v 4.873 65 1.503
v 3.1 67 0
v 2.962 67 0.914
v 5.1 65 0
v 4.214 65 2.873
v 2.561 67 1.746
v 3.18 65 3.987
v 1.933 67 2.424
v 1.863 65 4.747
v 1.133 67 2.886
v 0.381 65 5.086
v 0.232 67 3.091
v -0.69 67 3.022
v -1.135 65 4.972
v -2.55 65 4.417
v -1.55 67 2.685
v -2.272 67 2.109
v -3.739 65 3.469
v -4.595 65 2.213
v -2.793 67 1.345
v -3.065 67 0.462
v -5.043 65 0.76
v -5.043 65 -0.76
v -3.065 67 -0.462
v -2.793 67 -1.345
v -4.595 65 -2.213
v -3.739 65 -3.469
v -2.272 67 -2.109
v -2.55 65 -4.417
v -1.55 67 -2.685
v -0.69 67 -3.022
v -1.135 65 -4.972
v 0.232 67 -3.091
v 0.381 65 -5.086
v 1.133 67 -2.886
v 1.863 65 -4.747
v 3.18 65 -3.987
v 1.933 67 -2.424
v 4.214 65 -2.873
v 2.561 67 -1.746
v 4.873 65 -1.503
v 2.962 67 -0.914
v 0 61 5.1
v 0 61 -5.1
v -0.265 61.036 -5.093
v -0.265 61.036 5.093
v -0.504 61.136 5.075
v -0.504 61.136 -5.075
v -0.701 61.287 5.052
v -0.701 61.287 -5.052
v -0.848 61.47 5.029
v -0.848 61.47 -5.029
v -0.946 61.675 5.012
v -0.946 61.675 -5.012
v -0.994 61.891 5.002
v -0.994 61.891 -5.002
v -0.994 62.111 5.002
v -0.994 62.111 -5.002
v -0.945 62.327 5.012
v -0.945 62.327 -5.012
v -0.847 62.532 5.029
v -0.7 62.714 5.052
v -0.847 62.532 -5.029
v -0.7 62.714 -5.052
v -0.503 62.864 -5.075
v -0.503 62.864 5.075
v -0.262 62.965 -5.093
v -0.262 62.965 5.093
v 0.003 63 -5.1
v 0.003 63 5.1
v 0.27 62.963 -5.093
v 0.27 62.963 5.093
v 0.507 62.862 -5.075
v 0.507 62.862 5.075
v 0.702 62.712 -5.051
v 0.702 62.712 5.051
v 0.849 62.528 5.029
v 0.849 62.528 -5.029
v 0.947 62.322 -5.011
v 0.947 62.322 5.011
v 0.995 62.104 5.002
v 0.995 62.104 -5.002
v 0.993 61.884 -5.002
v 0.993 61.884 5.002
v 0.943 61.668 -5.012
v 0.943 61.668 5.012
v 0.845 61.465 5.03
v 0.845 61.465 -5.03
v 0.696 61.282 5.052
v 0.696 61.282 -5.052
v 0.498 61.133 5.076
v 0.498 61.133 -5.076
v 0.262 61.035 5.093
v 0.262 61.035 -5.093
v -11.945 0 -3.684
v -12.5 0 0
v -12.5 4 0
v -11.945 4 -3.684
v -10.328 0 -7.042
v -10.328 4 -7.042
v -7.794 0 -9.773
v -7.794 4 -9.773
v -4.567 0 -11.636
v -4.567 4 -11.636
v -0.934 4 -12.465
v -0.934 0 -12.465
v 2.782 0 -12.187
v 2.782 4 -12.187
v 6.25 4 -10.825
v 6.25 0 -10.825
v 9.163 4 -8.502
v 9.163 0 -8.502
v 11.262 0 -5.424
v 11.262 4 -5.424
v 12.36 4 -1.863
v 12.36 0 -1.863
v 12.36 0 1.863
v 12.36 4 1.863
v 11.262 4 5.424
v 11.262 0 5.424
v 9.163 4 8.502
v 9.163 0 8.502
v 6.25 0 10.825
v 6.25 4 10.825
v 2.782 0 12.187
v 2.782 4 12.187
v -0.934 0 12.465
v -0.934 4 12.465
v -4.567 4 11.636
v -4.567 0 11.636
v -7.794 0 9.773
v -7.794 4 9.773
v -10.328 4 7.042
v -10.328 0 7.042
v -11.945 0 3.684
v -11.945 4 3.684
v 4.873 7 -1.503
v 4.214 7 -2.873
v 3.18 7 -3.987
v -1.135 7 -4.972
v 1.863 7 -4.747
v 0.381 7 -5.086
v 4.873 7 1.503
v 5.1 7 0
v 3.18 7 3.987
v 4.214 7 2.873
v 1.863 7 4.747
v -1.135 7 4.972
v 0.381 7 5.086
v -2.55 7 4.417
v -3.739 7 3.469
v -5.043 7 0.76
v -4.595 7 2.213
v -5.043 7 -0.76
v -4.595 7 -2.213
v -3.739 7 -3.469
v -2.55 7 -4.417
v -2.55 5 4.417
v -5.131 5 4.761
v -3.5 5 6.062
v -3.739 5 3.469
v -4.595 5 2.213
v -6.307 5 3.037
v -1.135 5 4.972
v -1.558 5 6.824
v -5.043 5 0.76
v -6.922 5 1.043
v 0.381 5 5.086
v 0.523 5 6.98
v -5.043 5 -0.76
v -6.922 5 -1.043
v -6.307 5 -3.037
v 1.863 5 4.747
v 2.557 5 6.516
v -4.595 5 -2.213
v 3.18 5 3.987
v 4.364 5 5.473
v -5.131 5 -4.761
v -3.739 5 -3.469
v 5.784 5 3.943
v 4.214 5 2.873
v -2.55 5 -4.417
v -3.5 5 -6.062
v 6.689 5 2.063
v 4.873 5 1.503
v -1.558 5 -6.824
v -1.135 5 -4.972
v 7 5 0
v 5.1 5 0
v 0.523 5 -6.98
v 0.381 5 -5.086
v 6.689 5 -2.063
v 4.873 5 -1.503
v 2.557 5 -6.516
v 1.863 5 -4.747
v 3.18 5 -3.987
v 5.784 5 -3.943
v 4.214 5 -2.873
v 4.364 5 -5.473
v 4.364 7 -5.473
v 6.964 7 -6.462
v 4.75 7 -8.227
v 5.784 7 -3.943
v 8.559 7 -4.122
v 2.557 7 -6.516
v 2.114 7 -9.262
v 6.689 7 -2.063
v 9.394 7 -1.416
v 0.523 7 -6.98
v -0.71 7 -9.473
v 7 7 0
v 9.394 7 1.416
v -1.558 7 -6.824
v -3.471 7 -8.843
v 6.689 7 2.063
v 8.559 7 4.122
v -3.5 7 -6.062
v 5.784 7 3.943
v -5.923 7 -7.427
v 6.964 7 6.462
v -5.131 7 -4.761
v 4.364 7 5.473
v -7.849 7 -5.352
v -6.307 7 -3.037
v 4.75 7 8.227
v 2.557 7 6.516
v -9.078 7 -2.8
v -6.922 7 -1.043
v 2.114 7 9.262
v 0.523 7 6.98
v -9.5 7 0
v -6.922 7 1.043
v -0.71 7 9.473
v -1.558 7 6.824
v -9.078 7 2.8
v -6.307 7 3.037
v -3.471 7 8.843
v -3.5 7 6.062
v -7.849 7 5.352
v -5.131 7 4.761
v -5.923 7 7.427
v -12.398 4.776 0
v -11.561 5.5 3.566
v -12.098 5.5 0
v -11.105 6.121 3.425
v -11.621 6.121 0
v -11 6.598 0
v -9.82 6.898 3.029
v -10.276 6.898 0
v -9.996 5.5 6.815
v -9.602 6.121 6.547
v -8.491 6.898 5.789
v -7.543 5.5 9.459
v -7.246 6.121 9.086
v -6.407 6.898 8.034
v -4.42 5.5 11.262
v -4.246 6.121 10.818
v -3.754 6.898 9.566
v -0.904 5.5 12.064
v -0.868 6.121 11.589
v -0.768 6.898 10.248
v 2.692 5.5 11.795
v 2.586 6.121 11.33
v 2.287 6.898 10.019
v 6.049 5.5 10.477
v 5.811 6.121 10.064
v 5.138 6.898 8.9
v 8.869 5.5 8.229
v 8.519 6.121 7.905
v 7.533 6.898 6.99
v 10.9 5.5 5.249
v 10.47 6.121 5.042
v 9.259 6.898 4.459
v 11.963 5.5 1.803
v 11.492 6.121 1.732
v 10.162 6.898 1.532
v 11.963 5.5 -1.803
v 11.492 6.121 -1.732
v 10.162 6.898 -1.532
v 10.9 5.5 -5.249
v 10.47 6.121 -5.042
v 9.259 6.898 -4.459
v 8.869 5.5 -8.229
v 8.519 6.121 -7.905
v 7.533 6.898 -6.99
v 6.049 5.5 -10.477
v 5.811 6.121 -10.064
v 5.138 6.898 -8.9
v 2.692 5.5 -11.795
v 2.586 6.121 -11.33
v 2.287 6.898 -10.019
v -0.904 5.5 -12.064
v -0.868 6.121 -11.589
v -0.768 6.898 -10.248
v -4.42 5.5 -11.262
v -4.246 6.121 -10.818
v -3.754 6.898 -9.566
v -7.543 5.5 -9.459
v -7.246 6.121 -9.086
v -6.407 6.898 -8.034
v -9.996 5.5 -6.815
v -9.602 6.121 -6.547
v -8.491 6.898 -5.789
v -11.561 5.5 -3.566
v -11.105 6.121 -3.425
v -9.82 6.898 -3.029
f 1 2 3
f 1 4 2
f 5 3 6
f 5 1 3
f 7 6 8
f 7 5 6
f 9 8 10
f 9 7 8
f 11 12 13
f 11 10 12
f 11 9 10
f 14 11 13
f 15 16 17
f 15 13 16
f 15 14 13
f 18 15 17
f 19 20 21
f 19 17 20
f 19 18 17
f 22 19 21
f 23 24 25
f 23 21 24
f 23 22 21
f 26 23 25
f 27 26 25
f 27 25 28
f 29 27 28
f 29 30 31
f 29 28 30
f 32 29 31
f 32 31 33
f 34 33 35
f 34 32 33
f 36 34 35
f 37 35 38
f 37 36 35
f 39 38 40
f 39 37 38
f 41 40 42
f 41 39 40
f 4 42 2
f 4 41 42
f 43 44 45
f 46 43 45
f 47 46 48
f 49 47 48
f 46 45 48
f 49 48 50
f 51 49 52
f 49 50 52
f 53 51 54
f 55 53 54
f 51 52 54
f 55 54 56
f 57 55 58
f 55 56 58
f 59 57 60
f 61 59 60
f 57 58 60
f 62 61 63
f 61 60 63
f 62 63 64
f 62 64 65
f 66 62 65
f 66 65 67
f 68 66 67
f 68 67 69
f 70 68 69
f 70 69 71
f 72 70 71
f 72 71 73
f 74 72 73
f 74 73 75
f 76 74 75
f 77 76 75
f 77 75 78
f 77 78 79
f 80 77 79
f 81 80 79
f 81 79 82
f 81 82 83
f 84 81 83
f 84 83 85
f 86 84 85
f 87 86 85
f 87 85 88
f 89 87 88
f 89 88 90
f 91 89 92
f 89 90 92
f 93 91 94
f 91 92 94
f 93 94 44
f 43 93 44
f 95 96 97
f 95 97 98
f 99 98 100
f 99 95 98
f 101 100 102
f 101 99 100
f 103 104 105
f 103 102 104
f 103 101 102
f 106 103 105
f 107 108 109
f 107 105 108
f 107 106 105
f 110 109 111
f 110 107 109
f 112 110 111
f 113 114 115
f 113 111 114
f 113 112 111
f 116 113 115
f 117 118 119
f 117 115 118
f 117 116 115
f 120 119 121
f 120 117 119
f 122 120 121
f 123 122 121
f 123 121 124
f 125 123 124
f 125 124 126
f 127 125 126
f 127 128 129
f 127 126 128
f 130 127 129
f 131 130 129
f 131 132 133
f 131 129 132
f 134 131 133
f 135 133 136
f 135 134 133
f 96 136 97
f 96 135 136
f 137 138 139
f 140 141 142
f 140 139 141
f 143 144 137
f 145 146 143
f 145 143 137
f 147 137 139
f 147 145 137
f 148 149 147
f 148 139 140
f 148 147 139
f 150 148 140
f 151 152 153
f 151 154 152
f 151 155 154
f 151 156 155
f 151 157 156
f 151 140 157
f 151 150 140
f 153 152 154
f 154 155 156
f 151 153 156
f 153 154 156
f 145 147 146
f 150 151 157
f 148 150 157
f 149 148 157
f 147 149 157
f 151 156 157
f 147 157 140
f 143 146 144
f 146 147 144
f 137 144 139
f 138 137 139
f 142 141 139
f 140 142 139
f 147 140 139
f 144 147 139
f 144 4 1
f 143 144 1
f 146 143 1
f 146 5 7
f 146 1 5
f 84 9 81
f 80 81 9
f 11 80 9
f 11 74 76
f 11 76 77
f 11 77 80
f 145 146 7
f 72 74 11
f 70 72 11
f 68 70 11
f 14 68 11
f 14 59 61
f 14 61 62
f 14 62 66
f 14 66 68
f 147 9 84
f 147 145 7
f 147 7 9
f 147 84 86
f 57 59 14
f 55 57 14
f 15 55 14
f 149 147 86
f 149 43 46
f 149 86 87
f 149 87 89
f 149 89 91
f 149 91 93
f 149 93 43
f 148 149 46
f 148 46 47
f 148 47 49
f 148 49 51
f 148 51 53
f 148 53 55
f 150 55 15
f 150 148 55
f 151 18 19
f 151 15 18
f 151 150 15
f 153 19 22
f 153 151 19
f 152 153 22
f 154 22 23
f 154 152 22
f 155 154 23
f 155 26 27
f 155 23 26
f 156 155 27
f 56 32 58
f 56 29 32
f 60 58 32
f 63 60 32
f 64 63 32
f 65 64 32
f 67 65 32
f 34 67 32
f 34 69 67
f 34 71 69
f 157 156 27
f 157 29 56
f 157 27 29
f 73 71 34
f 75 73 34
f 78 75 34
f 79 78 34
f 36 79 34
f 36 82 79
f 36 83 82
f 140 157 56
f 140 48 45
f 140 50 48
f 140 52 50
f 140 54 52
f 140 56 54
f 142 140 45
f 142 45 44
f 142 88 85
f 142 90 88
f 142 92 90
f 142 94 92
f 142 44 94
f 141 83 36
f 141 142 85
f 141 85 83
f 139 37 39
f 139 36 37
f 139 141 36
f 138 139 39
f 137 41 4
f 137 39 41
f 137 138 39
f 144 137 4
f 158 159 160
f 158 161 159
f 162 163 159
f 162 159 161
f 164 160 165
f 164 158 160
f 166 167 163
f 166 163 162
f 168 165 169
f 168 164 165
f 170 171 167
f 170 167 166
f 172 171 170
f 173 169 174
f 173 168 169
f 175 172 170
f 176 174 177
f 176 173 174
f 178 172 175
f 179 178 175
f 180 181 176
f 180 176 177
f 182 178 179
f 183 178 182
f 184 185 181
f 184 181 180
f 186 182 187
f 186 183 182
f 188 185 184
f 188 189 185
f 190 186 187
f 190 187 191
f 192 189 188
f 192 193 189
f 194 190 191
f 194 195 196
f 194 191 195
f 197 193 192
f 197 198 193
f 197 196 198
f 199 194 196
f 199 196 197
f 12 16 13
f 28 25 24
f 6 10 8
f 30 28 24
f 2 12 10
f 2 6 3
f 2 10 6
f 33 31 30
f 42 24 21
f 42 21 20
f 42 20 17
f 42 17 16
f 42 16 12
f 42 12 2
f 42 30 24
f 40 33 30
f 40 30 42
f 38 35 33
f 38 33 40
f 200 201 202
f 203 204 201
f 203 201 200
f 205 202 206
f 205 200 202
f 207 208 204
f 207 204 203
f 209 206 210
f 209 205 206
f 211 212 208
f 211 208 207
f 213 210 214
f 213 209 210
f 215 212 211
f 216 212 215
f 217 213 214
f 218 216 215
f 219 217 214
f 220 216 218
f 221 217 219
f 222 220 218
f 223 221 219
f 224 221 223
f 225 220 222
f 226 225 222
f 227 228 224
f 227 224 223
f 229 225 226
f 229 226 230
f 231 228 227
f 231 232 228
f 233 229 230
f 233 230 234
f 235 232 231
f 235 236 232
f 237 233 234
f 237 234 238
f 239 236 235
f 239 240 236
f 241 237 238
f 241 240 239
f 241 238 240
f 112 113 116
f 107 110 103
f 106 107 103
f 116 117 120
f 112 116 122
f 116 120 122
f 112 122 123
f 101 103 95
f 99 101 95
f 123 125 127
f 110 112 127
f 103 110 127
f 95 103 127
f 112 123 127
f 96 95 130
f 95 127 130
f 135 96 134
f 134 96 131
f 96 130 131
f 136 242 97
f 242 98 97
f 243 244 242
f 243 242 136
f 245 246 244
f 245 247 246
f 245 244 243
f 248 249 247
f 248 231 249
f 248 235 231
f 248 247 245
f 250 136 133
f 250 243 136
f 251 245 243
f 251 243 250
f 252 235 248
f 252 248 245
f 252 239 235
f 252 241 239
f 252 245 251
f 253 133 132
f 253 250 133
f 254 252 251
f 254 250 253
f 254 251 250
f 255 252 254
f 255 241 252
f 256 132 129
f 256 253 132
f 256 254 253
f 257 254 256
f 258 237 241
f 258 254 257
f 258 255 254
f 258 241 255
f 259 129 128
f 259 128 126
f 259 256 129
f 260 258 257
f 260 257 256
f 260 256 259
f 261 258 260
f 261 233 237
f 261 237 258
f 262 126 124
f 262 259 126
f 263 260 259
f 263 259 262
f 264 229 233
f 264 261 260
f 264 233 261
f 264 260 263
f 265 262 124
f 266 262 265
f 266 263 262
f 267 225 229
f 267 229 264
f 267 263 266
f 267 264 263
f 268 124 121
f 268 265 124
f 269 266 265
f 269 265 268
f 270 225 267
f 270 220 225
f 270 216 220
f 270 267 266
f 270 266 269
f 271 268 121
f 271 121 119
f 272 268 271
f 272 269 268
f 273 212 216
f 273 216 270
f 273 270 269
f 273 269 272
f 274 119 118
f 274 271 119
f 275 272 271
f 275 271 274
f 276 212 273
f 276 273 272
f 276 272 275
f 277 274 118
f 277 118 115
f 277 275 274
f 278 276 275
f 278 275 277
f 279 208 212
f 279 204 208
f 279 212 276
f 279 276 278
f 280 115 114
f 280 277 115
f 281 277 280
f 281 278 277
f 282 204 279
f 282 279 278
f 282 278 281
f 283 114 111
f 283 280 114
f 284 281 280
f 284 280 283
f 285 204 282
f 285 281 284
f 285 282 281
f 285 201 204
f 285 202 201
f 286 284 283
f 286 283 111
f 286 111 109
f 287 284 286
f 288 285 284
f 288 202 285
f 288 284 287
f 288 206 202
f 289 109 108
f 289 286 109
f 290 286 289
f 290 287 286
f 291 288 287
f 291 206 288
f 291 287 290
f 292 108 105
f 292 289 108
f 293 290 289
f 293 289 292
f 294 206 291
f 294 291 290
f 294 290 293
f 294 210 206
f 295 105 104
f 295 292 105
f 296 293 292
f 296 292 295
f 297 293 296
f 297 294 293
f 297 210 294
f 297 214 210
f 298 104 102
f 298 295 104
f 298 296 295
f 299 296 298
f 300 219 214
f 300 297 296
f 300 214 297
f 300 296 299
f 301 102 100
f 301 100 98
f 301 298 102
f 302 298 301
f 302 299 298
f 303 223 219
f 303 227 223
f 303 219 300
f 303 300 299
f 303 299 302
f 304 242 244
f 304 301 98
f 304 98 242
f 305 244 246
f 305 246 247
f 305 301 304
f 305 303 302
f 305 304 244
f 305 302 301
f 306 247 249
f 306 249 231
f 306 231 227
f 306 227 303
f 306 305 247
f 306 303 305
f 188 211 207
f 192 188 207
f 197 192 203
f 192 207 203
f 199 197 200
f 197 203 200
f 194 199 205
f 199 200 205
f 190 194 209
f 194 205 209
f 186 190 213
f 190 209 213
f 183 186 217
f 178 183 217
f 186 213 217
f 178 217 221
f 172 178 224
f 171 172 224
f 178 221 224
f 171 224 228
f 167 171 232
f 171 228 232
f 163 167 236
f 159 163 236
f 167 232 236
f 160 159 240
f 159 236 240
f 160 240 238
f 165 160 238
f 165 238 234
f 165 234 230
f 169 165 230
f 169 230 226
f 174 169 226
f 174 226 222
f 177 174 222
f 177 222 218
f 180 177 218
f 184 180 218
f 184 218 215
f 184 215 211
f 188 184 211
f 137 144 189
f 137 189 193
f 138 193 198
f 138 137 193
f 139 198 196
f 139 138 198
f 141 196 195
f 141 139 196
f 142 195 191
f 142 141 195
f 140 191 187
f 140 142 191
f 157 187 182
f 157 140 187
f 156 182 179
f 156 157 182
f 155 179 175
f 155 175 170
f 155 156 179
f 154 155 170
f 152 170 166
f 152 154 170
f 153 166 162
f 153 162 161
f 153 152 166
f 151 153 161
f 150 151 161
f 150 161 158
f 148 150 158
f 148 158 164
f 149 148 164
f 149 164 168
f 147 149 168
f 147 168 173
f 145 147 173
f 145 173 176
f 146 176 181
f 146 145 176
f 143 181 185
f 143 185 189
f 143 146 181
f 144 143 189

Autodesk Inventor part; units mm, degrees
ref_plane "YZ Plane" through (0, 0, 0) normal (1, 0, 0) x (0, 1, 0)
ref_plane "XZ Plane" through (0, 0, 0) normal (0, 1, 0) x (-1, 0, 0)
sketch "Skizze1" plane through (0, 0, 0) normal (0, 1, 0) x (-1, 0, 0)
  circle A0 centre (0, 0) radius 12.5
  dimension "d0" = 25
extrude "Extrusion1" add sketch "Skizze1" along normal blind 7
fillet "Rundung1" radius 3 1 edges at (12.5, 7, 0)
sketch "Skizze2" plane through (0, 7, 0) normal (0, 1, 0) x (1, 0, 0)
  circle A0 centre (0, 0) radius 5.1
  dimension "d4" = 10.2
extrude "Extrusion2" add sketch "Skizze2" along normal blind 60 separate body
ref_plane "Arbeitsebene1" through (0, 0, 0) normal (0, 0, 1) x (1, 0, 0)
sketch "Skizze3" plane through (0, 0, 0) normal (0, 0, 1) x (1, 0, 0)
  line L0 (5.1, 67) -> (-5.1, 67) projected
  line L1 (0, -11) -> (0, 66) projected
  point P0 (0, 0)
  point P1 (0, 62)
  point P2 (0, 62)
  dimension "d8" = 5
hole "Bohrung1" at (0, 62, 0) direction (0, 0, -1) diameter 2 end through all both bodies 2
chamfer "Fase1" distance 2 angle 45 1 edges at (-5.1, 67, 0)
sketch "Skizze4" plane through (0, 7, 0) normal (0, 1, 0) x (1, 0, 0)
  circle A0 centre (0, 0) radius 5.1 projected
  circle A1 centre (0, 0) radius 4.875
  line L0 (17.5, 0) -> (-17.5, 0) projected
  circle A2 centre (0, 0) radius 7
  dimension "d19" = 9.75
  dimension "d20" = 14
extrude "Extrusion3" cut sketch "Skizze4" against normal blind 2 contours L0 A2 A0 | A0 L0 A2 bodies 1
properties part number "Fuß"
